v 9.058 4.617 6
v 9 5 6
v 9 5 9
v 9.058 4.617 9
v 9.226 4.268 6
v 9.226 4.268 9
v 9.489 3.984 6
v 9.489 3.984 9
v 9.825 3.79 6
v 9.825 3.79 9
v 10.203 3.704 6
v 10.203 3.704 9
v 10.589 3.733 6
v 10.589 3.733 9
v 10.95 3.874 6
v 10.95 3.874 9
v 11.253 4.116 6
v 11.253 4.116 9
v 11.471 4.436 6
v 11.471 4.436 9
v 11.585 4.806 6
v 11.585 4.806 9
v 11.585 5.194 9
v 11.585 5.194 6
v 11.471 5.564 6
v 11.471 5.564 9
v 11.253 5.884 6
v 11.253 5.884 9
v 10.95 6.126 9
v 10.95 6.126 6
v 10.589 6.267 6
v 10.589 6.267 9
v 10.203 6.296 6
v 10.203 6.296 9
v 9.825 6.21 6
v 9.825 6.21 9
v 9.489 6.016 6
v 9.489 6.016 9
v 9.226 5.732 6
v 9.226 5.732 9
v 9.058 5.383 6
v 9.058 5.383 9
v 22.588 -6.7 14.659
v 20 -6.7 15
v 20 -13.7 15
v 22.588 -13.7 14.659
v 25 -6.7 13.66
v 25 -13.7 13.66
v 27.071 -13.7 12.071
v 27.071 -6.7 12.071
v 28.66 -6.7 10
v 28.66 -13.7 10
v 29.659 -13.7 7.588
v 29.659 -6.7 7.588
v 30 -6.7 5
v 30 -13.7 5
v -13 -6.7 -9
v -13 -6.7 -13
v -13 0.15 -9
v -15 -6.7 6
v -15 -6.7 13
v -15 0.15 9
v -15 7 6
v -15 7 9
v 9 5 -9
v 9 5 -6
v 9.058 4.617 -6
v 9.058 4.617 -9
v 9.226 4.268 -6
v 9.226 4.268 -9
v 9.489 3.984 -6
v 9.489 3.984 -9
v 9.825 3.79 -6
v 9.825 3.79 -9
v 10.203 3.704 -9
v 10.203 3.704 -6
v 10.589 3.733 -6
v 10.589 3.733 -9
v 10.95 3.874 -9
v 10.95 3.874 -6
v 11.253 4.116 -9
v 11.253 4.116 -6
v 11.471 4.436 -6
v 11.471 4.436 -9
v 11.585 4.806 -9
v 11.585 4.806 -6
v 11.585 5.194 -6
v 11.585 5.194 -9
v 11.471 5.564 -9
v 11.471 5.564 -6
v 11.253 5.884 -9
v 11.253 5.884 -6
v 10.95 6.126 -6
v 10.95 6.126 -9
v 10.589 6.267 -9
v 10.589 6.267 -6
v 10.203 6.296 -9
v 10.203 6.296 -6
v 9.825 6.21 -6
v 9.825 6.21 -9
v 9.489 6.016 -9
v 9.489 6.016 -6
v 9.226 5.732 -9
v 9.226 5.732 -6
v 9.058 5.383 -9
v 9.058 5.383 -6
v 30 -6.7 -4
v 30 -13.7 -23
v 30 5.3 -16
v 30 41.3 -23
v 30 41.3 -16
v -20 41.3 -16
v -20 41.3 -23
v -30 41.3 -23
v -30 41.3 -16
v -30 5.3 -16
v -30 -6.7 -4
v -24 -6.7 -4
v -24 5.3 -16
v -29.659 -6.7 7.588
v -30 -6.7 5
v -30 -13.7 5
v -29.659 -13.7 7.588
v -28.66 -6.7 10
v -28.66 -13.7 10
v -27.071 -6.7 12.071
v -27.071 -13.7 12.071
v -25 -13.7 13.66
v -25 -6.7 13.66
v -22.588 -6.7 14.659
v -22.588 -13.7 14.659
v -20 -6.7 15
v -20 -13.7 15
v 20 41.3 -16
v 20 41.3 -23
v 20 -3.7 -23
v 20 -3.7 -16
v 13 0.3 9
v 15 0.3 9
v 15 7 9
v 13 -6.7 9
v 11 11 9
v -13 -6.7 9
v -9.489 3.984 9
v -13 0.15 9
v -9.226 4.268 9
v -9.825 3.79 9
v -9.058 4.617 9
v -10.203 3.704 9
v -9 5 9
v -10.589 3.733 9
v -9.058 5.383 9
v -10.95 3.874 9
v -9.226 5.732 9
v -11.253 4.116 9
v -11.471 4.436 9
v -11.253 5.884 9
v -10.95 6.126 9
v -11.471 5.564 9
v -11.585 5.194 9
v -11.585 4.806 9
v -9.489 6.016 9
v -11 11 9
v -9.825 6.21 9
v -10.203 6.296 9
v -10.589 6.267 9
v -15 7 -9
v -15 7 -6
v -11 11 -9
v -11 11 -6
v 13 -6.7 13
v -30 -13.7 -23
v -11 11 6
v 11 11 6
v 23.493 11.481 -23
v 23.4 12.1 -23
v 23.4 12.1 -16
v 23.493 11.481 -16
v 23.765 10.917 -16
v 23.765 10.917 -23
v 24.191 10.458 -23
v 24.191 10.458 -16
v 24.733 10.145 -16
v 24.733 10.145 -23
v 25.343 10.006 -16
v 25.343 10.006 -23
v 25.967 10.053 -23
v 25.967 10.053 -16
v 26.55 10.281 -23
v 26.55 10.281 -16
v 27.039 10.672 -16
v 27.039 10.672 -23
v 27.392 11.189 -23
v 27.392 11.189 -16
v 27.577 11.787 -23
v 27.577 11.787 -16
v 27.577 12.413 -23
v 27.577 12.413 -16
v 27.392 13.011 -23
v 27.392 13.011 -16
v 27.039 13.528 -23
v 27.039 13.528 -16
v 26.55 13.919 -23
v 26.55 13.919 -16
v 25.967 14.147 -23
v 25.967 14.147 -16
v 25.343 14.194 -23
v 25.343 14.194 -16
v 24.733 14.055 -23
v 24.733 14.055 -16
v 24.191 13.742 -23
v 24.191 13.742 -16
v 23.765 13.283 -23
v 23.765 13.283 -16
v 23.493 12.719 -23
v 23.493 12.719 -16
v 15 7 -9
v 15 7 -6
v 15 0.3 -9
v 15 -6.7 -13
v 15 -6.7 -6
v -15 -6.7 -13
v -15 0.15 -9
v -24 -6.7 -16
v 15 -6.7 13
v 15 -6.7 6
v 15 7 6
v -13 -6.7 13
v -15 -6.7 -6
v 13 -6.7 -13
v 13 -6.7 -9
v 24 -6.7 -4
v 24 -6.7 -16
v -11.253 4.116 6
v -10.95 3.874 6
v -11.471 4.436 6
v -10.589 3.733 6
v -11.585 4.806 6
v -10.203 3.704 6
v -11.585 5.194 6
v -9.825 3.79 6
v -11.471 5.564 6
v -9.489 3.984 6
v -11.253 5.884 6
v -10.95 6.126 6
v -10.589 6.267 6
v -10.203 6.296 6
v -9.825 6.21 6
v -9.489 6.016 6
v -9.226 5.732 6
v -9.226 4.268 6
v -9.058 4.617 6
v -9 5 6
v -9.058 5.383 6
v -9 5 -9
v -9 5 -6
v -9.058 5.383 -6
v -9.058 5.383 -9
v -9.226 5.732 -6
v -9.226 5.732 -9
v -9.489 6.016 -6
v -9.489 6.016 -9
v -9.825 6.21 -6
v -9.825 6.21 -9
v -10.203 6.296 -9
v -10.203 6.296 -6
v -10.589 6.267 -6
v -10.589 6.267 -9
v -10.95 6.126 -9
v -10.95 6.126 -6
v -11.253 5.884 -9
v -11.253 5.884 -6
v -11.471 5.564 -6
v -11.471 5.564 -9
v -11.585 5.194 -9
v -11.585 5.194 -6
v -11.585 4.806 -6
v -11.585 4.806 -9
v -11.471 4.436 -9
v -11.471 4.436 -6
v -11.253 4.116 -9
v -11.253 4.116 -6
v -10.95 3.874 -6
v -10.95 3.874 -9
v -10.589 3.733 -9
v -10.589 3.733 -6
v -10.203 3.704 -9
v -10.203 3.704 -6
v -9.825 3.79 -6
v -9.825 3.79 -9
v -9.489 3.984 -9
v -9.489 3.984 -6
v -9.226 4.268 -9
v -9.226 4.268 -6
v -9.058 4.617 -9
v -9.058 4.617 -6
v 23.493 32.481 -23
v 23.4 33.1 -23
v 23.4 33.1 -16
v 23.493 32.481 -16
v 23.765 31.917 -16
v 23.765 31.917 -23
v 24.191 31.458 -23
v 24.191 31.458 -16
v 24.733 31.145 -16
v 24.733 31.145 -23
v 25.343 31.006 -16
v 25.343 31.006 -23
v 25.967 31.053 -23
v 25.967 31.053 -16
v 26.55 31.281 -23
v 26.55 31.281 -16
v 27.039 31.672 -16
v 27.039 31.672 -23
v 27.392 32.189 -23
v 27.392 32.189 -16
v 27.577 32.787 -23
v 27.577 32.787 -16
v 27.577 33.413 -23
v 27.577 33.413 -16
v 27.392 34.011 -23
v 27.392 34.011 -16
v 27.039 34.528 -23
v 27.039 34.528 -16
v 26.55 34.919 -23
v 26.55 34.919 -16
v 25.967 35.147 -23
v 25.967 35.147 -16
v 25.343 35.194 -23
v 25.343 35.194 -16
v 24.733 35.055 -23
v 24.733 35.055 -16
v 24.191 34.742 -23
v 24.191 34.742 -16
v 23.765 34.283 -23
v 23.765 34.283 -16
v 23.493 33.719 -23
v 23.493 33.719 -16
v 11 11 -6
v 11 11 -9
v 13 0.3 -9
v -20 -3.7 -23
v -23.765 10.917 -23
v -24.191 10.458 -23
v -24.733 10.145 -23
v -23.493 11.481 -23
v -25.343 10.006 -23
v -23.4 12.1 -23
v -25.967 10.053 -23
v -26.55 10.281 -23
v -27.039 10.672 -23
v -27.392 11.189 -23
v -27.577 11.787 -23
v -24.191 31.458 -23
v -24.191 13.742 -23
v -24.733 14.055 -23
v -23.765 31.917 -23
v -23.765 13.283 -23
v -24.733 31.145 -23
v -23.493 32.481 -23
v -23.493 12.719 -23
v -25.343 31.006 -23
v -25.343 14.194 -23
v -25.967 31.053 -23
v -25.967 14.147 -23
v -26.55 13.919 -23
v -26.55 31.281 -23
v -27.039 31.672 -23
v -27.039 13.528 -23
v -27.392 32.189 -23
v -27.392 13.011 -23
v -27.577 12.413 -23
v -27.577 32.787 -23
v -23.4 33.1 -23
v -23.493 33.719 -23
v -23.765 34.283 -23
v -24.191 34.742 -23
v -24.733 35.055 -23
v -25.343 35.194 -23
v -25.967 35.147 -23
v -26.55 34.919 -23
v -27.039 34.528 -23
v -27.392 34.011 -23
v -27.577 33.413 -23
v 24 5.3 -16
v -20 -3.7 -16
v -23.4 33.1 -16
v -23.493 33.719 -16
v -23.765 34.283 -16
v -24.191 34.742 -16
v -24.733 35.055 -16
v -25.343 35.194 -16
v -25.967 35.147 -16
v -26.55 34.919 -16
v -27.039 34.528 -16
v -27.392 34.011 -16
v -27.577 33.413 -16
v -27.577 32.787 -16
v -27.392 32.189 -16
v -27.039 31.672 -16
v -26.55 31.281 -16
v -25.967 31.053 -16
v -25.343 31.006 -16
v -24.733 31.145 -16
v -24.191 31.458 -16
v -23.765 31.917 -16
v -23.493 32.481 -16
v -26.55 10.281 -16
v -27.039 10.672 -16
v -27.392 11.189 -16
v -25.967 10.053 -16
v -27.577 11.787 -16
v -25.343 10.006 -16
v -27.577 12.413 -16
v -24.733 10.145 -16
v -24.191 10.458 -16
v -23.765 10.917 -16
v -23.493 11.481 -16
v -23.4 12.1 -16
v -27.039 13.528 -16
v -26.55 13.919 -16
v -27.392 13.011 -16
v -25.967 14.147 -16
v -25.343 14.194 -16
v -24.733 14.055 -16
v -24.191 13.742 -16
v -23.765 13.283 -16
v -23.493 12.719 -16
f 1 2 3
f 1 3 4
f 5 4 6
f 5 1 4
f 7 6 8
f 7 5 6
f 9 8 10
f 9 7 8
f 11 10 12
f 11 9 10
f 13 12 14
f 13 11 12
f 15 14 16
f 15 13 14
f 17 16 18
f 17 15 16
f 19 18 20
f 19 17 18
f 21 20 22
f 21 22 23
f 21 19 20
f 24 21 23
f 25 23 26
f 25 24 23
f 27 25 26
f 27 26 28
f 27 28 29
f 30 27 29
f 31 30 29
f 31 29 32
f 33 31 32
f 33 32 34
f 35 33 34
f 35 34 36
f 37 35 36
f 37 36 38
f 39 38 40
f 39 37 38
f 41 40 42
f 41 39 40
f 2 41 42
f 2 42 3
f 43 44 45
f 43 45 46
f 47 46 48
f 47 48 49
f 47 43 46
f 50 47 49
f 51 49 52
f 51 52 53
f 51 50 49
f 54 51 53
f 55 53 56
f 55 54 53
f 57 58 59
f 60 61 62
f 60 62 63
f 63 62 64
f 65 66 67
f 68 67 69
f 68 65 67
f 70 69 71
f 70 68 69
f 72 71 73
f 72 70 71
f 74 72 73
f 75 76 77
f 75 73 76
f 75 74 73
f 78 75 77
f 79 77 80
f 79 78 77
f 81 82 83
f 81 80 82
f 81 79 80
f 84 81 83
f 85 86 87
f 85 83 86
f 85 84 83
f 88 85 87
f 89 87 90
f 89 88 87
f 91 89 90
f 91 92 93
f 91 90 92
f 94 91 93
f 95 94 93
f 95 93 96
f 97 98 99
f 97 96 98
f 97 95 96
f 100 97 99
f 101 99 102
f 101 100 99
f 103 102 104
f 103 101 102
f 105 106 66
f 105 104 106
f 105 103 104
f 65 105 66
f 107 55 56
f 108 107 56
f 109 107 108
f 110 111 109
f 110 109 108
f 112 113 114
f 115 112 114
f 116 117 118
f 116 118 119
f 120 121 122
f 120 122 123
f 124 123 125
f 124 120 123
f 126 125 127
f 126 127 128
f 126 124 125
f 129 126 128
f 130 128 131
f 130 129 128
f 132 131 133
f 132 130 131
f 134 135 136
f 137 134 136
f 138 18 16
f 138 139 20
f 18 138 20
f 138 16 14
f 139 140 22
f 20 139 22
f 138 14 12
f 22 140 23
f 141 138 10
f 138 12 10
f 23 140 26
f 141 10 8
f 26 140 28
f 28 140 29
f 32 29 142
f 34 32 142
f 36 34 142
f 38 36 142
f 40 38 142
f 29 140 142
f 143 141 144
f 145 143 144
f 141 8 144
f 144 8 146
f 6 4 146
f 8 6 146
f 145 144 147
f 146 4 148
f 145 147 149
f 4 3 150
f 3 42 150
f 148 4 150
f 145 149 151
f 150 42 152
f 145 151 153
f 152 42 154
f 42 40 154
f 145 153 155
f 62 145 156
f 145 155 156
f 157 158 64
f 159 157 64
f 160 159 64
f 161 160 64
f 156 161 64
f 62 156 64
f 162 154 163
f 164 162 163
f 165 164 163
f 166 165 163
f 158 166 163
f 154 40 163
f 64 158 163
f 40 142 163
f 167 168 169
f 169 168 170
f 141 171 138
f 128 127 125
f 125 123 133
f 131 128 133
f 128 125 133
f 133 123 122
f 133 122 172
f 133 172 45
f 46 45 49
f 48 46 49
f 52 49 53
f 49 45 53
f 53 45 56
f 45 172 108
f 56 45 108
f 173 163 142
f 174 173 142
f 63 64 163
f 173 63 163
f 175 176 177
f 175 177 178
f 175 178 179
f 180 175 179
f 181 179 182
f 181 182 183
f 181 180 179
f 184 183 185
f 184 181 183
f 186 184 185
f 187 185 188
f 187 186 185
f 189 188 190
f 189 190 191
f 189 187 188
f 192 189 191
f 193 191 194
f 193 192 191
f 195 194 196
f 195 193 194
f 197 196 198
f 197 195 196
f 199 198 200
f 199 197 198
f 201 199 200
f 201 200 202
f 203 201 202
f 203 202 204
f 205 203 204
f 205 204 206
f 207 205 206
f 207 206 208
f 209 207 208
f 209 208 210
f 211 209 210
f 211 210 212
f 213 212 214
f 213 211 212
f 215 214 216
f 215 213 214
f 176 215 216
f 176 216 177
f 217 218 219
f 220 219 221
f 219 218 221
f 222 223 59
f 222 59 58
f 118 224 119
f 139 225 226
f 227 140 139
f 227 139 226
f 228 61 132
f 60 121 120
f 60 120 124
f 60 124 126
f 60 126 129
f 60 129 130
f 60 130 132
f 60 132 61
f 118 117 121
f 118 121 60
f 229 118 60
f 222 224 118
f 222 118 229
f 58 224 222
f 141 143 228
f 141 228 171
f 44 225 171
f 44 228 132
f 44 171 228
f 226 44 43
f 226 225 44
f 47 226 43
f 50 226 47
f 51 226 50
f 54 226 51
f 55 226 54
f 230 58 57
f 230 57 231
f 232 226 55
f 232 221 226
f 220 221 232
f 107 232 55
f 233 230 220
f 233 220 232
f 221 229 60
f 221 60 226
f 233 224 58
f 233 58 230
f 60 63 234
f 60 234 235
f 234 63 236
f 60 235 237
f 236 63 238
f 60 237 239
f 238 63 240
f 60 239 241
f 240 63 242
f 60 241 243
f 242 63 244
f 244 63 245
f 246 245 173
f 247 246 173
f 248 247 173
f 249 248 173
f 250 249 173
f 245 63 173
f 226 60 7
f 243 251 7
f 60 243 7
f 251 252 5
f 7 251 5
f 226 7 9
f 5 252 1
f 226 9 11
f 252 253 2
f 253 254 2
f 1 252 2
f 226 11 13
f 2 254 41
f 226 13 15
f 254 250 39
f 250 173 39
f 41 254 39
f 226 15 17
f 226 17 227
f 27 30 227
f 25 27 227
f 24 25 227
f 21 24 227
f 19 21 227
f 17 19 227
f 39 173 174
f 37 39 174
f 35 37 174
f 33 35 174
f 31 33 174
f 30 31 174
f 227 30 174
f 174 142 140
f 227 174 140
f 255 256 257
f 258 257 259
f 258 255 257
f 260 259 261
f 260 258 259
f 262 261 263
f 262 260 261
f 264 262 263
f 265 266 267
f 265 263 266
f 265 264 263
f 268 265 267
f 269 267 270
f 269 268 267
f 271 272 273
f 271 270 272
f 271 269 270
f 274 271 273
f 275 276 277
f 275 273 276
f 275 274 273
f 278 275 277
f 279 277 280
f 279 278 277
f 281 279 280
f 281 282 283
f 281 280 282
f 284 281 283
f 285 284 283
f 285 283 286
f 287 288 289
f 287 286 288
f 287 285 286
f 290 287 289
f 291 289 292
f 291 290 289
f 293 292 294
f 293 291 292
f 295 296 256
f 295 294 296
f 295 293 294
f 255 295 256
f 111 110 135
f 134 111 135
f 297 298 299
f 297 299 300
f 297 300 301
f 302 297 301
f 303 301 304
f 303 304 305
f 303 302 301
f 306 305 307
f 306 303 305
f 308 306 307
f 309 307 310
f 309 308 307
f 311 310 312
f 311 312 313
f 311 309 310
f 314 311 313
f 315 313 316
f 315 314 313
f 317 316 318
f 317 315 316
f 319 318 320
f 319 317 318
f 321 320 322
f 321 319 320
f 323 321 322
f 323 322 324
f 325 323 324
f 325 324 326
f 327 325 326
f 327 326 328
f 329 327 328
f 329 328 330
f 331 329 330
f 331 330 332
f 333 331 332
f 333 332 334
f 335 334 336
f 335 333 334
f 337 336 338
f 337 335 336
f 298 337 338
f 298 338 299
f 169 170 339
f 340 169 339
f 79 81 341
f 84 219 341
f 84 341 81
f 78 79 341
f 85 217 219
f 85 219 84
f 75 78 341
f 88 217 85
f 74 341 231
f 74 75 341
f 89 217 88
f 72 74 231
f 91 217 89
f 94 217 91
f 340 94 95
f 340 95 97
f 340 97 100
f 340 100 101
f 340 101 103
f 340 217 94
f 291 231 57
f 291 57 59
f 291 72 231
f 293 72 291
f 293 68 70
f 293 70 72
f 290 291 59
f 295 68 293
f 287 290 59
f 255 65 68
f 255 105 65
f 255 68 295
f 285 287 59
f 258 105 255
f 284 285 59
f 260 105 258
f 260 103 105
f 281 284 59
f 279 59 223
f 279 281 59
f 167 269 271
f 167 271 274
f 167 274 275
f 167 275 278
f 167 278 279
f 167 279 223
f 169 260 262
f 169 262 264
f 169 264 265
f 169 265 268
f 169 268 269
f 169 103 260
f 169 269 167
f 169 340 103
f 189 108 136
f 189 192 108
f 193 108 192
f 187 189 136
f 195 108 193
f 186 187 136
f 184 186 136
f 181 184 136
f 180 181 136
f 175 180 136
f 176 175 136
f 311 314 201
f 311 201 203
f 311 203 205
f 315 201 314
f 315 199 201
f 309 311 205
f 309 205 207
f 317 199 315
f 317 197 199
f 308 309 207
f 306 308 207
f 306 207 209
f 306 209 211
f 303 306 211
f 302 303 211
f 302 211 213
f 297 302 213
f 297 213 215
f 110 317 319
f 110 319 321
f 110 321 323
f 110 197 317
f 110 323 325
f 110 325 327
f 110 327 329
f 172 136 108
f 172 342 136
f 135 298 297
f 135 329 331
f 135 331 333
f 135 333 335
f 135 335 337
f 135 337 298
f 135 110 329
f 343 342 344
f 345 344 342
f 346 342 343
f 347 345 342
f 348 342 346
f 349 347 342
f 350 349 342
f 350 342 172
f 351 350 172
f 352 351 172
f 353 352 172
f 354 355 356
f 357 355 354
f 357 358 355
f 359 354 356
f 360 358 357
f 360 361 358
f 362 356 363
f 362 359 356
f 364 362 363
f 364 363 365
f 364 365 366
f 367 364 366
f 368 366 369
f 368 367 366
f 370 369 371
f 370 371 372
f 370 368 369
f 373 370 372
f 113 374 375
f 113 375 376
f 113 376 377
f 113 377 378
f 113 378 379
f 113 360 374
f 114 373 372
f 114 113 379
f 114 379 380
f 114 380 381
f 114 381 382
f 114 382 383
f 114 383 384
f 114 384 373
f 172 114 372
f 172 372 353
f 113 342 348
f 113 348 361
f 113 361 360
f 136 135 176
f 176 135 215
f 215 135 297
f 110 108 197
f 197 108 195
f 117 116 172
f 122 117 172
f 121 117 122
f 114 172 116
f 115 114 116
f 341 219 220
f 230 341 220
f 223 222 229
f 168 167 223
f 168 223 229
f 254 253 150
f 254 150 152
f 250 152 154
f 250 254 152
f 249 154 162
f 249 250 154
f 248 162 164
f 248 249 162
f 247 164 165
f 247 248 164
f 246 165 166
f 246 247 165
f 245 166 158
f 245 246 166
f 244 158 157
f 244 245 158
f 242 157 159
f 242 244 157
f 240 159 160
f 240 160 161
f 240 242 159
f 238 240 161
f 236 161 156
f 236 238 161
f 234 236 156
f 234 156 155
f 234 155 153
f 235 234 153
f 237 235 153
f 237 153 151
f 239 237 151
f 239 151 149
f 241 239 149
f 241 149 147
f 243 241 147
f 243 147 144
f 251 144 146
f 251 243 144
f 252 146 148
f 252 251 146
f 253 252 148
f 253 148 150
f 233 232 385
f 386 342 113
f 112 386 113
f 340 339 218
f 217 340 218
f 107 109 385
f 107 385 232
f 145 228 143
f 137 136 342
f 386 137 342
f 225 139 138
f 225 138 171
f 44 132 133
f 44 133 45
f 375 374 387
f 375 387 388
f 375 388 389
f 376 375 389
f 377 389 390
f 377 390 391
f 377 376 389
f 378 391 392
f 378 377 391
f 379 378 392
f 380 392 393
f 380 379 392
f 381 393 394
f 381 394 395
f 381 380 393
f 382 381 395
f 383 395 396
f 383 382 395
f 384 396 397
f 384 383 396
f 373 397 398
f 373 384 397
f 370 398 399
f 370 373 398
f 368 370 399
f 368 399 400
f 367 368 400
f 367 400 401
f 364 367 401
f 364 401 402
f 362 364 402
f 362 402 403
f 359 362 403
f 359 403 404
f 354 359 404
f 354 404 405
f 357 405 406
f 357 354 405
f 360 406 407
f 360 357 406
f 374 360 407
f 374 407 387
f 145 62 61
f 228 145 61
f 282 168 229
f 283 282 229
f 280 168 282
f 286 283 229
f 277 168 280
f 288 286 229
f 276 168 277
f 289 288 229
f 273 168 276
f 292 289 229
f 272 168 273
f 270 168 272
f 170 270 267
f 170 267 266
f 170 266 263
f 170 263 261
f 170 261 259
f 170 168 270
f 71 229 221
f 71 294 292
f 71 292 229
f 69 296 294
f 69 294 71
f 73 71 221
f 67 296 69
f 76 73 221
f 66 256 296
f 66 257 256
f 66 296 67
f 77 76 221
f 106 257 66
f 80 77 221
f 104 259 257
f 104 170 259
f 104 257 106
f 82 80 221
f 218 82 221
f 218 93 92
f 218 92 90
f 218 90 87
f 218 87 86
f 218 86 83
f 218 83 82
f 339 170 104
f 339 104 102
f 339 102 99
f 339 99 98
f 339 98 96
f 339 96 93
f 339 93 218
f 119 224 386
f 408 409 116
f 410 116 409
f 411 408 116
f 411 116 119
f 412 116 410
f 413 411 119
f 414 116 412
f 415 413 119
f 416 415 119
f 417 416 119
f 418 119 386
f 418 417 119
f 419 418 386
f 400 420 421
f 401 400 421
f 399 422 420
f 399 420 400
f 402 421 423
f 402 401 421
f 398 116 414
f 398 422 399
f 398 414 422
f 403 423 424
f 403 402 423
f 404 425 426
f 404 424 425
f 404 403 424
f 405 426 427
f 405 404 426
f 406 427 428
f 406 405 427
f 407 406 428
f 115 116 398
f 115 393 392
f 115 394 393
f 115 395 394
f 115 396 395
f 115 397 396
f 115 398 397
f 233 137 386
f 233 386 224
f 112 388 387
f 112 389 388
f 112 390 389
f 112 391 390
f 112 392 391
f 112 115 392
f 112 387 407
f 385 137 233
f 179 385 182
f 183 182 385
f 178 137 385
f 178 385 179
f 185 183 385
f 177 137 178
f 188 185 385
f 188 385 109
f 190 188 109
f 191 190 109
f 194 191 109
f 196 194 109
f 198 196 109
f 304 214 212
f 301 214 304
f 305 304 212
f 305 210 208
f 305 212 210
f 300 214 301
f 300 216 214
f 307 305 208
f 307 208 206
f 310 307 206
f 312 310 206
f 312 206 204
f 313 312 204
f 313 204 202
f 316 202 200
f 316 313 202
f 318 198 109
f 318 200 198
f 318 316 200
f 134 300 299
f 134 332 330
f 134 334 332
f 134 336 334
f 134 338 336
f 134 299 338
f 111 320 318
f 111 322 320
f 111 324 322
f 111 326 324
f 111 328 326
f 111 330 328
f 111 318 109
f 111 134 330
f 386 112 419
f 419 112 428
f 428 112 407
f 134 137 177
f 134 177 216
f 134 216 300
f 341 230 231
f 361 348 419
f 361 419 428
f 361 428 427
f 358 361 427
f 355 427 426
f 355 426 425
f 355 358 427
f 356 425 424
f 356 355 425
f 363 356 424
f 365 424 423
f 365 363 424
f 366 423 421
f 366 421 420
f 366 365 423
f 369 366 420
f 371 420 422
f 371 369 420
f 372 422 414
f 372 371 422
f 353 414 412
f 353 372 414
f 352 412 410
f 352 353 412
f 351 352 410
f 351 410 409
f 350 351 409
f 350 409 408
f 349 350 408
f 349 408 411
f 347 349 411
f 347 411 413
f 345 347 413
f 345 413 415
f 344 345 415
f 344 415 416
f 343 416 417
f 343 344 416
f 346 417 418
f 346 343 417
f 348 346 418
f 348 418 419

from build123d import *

# Parameters (mm, degrees)
SKETCH_2_R          = 1.3
EXTRUDE_1_DEPTH     = 9
SKETCH_3_W          = 30
SKETCH_3_H          = 20.835575778
CUT_EXTRUDE_1_DEPTH = 6
EXTRUDE_START       = -6.7
EXTRUDE_2_DEPTH     = 7
EXTRUDE_3_DEPTH     = 2
EXTRUDE_4_DEPTH     = 2
SKETCH_11_R         = 2.1
EXTRUDE_5_DEPTH     = 7
EXTRUDE_6_DEPTH     = 6
EXTRUDE_7_DEPTH     = 6


with BuildPart() as part:
    # 草图2 → 凸台-拉伸1 (new, symmetric)
    with BuildSketch(Plane.XY):
        Polygon((-11, 11), (11, 11), (15, 7), (15, -11), (-15, -11), (-15, 7), align=None)
        with Locations((-10.3, 5)):
            Circle(SKETCH_2_R, mode=Mode.SUBTRACT)
        with Locations(Location((10.3, 5, 0), (0, 0, 180))):
            Circle(SKETCH_2_R, mode=Mode.SUBTRACT)
    extrude(amount=EXTRUDE_1_DEPTH, both=True)

    # 草图3 → 切除-拉伸1 (cut, symmetric)
    with BuildSketch(Plane.XY):
        with Locations((0, 3.717787889)):
            Rectangle(SKETCH_3_W, SKETCH_3_H)
    extrude(amount=CUT_EXTRUDE_1_DEPTH, both=True, mode=Mode.SUBTRACT)

    # 草图6 → 凸台-拉伸2 (add)
    with BuildSketch(Plane(origin=(0, 0, 0), x_dir=(1, 0, 0), z_dir=(0, 1, 0)).offset(EXTRUDE_START)):
        with BuildLine():
            Line((-20, -15), (20, -15))
            ThreePointArc((20, -15), (27.071067812, -12.071067812), (30, -5))
            Line((30, -5), (30, 23))
            Line((30, 23), (-30, 23))
            Line((-30, 23), (-30, -5))
            ThreePointArc((-30, -5), (-27.071067812, -12.071067812), (-20, -15))
        make_face()
    extrude(amount=-EXTRUDE_2_DEPTH)

    # 草图7 → 凸台-拉伸3 (add)
    with BuildSketch(Plane(origin=(15, 0, 0), x_dir=(0, 0, -1), z_dir=(1, 0, 0))):
        Polygon((-9, 0.3), (-13, -6.7), (-9, -6.7), align=None)
        Polygon((9, -6.7), (9, 0.3), (13, -6.7), align=None)
    extrude(amount=-EXTRUDE_3_DEPTH)

    # 草图10 → 凸台-拉伸4 (add)
    with BuildSketch(Plane.ZY.offset(15)):
        Polygon((-9, 0.15), (-13, -6.7), (-9, -6.7), align=None)
        Polygon((9, -6.7), (9, 0.15), (13, -6.7), align=None)
    extrude(amount=-EXTRUDE_4_DEPTH)

    # 草图11 → 凸台-拉伸5 (add)
    with BuildSketch(Plane.XY.offset(-23)):
        Polygon((-30, -11.7), (30, -11.7), (30, 41.3), (20, 41.3), (20, -3.7), (-20, -3.7), (-20, 41.3), (-30, 41.3), align=None)
        with Locations((-25.5, 33.1)):
            Circle(SKETCH_11_R, mode=Mode.SUBTRACT)
        with Locations((-25.5, 12.1)):
            Circle(SKETCH_11_R, mode=Mode.SUBTRACT)
        with Locations(Location((25.5, 12.1, 0), (0, 0, 180))):
            Circle(SKETCH_11_R, mode=Mode.SUBTRACT)
        with Locations(Location((25.5, 33.1, 0), (0, 0, 180))):
            Circle(SKETCH_11_R, mode=Mode.SUBTRACT)
    extrude(amount=EXTRUDE_5_DEPTH)

    # 草图12 → 凸台-拉伸6 (add)
    with BuildSketch(Plane.ZY.offset(30)):
        Polygon((-4, -6.7), (-16, 5.3), (-16, -6.7), align=None)
    extrude(amount=-EXTRUDE_6_DEPTH)

    # 草图13 → 凸台-拉伸7 (add)
    with BuildSketch(Plane(origin=(30, 0, 0), x_dir=(0, 0, -1), z_dir=(1, 0, 0))):
        Polygon((16, -6.7), (16, 5.3), (4, -6.7), align=None)
    extrude(amount=-EXTRUDE_7_DEPTH)


solid = part.part
